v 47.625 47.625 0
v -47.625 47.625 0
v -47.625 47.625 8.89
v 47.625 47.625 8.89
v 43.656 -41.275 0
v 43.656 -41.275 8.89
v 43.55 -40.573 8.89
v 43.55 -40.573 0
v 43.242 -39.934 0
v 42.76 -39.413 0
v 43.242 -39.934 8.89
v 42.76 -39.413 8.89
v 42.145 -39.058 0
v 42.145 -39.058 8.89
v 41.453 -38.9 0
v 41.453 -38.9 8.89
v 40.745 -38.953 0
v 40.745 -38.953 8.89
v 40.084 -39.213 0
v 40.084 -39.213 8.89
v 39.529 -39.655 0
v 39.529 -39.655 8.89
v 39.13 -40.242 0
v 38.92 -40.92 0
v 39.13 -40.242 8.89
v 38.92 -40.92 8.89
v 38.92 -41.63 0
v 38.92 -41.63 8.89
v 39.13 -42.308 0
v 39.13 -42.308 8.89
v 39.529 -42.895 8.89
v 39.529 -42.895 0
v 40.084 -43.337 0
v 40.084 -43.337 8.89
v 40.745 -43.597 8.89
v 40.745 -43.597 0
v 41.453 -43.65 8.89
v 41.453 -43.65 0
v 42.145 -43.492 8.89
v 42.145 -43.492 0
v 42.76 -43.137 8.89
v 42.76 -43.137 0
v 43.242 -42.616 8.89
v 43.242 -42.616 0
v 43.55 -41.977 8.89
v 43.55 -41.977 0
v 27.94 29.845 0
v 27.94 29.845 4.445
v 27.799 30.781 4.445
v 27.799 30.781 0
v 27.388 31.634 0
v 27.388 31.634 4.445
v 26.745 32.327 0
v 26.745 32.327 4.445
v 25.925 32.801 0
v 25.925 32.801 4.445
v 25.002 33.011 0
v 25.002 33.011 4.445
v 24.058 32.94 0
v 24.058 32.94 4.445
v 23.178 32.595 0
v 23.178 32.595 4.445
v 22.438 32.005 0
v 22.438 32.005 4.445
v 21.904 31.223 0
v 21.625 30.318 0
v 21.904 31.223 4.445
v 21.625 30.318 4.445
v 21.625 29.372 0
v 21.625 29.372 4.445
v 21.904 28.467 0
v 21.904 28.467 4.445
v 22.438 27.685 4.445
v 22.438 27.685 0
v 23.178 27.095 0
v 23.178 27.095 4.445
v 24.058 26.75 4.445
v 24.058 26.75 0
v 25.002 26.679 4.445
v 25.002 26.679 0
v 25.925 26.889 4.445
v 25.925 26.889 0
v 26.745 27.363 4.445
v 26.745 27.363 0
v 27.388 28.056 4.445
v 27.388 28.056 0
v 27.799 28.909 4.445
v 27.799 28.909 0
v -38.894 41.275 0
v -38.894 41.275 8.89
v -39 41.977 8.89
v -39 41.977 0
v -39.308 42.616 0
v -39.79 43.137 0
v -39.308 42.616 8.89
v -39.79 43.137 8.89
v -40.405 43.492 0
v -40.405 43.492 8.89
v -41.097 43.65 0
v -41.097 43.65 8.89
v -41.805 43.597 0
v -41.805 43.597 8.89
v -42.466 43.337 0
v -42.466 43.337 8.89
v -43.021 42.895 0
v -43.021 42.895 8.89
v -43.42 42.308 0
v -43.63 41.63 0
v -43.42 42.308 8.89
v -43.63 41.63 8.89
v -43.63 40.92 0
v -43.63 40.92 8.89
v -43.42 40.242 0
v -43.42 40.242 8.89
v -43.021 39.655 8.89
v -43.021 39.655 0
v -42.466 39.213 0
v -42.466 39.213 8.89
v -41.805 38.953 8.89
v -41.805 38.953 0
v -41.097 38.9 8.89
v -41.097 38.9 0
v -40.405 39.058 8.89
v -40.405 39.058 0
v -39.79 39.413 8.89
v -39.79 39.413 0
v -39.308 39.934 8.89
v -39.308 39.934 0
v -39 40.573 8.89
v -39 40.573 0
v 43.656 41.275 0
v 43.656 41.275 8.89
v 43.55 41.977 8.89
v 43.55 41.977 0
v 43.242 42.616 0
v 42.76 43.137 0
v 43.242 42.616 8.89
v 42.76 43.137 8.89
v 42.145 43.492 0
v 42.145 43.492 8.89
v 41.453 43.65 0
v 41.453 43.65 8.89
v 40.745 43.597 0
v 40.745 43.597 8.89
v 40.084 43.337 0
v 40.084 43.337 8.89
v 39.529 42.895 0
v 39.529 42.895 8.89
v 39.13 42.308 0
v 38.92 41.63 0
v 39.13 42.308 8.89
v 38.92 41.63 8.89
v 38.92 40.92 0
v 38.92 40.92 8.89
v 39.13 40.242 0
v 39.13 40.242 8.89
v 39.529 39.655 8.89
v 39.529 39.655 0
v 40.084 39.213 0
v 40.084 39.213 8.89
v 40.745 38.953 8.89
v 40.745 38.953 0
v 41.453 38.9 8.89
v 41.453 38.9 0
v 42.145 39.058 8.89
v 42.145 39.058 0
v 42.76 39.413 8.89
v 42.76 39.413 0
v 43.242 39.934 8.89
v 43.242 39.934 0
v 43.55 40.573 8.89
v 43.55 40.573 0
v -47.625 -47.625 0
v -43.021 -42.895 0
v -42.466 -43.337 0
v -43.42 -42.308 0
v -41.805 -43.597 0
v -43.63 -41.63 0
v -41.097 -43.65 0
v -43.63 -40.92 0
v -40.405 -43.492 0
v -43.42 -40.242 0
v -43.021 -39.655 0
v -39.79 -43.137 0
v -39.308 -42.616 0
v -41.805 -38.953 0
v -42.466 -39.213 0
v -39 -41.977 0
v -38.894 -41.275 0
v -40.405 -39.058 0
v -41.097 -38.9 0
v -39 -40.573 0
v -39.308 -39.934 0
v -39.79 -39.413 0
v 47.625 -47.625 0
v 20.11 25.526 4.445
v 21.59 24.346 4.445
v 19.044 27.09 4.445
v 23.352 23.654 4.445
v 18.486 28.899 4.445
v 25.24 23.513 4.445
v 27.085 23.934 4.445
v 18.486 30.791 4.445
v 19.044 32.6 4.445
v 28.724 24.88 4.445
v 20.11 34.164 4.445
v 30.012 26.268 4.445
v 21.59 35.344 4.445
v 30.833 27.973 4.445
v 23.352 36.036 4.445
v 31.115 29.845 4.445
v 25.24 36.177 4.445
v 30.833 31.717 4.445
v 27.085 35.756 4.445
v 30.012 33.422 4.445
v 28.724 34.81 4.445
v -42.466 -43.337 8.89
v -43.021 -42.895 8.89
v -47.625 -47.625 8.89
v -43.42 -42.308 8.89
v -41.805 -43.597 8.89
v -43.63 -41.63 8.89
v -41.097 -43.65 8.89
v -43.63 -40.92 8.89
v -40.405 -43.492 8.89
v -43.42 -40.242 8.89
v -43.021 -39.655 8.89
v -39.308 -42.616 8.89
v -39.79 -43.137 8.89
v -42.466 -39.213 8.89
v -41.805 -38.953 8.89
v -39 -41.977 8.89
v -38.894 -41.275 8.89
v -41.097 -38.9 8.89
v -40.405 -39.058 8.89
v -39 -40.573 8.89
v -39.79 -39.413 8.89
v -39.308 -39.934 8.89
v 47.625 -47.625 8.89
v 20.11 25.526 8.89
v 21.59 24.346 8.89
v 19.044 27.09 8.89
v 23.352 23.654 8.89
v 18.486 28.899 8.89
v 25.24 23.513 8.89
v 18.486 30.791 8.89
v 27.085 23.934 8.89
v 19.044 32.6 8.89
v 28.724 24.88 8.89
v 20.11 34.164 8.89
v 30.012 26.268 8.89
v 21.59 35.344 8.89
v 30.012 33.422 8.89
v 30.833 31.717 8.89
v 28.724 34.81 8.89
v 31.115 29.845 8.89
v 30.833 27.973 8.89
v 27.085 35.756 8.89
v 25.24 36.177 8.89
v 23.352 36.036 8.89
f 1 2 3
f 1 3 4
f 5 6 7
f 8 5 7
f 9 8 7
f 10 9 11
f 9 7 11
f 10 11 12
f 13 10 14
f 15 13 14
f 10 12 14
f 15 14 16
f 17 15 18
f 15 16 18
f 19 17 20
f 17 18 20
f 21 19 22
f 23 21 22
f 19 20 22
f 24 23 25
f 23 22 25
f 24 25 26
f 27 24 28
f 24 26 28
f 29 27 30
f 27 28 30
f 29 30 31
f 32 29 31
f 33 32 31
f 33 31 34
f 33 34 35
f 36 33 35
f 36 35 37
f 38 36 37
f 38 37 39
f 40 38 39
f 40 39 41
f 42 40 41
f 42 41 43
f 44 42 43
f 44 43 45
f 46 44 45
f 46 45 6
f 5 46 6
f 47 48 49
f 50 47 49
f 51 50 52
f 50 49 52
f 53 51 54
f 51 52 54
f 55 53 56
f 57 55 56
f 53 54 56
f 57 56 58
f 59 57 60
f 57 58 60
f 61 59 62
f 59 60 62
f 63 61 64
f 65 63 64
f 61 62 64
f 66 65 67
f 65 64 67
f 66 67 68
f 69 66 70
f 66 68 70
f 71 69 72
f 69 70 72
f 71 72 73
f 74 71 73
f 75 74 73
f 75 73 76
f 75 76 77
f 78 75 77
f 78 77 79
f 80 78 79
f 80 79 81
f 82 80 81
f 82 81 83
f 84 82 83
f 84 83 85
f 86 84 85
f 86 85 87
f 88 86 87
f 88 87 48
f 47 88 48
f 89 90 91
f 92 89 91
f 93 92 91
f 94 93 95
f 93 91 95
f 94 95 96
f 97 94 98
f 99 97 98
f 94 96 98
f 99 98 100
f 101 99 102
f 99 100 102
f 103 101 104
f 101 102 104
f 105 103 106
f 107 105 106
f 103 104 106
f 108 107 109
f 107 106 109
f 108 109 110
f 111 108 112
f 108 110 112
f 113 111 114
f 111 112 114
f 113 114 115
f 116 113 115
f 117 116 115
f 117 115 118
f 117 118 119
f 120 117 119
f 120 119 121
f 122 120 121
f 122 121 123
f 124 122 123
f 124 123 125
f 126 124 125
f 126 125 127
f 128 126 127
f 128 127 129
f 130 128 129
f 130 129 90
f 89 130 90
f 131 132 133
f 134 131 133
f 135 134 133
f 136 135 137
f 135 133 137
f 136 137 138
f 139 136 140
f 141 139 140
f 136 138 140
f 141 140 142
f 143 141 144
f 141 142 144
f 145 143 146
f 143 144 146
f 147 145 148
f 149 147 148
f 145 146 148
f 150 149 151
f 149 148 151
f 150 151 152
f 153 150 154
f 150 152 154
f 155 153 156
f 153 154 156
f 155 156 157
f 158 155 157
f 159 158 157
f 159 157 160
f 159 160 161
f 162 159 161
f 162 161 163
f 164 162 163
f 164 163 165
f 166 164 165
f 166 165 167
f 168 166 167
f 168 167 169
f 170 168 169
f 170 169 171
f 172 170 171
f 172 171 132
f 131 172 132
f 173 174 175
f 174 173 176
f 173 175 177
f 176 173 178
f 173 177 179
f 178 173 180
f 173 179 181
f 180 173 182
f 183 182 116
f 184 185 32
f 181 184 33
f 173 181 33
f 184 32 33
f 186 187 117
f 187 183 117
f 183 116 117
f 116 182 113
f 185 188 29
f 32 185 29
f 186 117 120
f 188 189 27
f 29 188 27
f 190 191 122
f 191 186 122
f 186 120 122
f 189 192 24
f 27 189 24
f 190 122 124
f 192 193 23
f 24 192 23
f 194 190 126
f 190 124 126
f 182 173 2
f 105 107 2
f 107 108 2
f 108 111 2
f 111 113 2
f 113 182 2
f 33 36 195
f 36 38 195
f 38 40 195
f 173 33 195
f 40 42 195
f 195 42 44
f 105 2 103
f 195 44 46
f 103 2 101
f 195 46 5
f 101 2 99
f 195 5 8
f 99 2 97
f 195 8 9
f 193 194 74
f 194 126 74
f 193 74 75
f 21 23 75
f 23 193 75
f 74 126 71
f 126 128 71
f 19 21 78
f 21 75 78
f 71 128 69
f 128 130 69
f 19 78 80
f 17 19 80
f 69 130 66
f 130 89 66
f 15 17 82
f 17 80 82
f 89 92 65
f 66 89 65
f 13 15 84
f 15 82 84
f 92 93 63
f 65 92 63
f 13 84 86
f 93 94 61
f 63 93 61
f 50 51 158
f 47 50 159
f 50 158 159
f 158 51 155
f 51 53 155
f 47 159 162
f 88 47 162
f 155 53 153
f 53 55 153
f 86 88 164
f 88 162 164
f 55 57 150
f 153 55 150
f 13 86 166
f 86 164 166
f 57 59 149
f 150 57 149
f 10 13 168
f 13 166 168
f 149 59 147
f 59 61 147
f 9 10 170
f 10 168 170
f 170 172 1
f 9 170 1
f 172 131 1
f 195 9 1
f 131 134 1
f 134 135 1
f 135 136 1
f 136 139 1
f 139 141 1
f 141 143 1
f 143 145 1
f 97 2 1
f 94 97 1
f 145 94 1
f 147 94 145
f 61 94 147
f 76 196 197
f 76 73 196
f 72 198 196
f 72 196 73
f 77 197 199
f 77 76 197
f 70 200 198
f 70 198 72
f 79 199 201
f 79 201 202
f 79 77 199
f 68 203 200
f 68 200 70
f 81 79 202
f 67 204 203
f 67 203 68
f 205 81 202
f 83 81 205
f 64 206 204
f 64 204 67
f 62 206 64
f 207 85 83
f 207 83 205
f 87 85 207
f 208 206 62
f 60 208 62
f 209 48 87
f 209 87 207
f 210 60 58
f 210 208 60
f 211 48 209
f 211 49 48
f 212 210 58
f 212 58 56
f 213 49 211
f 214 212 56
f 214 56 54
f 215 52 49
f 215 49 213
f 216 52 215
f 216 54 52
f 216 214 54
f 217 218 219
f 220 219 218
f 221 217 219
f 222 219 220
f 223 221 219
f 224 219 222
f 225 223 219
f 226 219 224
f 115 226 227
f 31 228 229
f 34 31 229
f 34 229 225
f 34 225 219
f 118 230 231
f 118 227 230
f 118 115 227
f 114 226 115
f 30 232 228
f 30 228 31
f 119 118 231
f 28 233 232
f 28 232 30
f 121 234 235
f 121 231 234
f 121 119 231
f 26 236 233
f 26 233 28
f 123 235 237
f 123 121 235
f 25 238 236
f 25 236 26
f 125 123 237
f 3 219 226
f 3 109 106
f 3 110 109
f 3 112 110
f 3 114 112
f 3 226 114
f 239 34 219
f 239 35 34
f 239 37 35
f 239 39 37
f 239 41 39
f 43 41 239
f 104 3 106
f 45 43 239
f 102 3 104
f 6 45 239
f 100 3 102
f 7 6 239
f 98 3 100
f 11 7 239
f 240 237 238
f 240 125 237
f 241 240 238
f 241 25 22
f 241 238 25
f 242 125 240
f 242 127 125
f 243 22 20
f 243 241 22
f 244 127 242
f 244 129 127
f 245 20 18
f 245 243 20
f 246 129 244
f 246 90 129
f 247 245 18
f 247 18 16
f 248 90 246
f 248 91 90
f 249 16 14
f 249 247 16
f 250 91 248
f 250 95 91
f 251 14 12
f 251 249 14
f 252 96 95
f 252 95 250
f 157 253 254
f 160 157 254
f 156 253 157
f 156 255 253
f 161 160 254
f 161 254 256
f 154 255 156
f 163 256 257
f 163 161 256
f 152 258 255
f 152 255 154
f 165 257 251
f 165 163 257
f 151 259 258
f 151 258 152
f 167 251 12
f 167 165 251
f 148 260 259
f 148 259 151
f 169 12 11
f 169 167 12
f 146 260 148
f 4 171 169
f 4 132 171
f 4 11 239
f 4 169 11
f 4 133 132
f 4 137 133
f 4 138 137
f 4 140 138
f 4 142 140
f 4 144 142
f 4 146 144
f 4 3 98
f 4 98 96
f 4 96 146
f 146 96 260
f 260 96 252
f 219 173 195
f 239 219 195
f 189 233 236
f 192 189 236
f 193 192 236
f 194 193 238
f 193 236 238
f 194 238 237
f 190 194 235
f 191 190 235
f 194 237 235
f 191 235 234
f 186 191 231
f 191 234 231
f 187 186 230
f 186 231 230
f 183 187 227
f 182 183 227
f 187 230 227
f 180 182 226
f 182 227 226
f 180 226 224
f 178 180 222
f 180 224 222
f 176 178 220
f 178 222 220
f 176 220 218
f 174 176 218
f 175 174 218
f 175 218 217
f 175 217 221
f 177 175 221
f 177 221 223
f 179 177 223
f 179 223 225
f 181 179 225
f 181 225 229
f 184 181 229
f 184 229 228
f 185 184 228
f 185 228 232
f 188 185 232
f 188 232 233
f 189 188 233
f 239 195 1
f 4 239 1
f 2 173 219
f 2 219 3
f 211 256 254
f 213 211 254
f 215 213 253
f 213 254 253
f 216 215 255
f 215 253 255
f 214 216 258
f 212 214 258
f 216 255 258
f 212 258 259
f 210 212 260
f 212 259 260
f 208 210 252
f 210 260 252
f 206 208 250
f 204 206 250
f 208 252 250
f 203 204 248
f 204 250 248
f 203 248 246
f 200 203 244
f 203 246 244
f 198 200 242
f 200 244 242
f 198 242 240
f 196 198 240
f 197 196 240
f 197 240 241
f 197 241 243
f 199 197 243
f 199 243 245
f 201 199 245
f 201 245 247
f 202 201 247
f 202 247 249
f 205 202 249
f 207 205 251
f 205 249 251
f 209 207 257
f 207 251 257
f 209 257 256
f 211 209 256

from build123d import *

# Parameters (mm, degrees)
SKETCH1_W           = 95.25
SKETCH1_H           = 95.25
BOSS_EXTRUDE1_DEPTH = 8.89
SKETCH2_OUTSIDE_W   = 124.25
SKETCH2_OUTSIDE_H   = 124.25
SKETCH2_OUTSIDE_W_2 = 95.25
SKETCH2_OUTSIDE_H_2 = 95.25
SKETCH2_OUTSIDE_R   = 2.38125
CUT_EXTRUDE2_DEPTH  = 9.89
SKETCH3_R           = 6.35
CUT_EXTRUDE3_DEPTH  = 4.445
SKETCH4_R           = 3.175
CUT_EXTRUDE4_DEPTH  = 5.445


with BuildPart() as part:
    # Sketch1 → Boss-Extrude1 (new body)
    with BuildSketch(Plane.XY):
        Rectangle(SKETCH1_W, SKETCH1_H)
    extrude(amount=BOSS_EXTRUDE1_DEPTH)

    # Sketch2 outside → Cut-Extrude2 (cut, through all)
    with BuildSketch(Plane.XY.offset(8.89)):
        Rectangle(SKETCH2_OUTSIDE_W, SKETCH2_OUTSIDE_H)
        Rectangle(SKETCH2_OUTSIDE_W_2, SKETCH2_OUTSIDE_H_2, mode=Mode.SUBTRACT)
        with Locations((-41.275, 41.275)):
            Circle(SKETCH2_OUTSIDE_R)
        with Locations((41.275, 41.275)):
            Circle(SKETCH2_OUTSIDE_R)
        with Locations((41.275, -41.275)):
            Circle(SKETCH2_OUTSIDE_R)
        with Locations((-41.275, -41.275)):
            Circle(SKETCH2_OUTSIDE_R)
    extrude(amount=-CUT_EXTRUDE2_DEPTH, mode=Mode.SUBTRACT)

    # Sketch3 → Cut-Extrude3 (cut)
    with BuildSketch(Plane.XY.offset(8.89)):
        with Locations((24.765, 29.845)):
            Circle(SKETCH3_R)
    extrude(amount=-CUT_EXTRUDE3_DEPTH, mode=Mode.SUBTRACT)

    # Sketch4 → Cut-Extrude4 (cut, through all)
    with BuildSketch(Plane.XY.offset(4.445)):
        with Locations((24.765, 29.845)):
            Circle(SKETCH4_R)
    extrude(amount=-CUT_EXTRUDE4_DEPTH, mode=Mode.SUBTRACT)


solid = part.part
